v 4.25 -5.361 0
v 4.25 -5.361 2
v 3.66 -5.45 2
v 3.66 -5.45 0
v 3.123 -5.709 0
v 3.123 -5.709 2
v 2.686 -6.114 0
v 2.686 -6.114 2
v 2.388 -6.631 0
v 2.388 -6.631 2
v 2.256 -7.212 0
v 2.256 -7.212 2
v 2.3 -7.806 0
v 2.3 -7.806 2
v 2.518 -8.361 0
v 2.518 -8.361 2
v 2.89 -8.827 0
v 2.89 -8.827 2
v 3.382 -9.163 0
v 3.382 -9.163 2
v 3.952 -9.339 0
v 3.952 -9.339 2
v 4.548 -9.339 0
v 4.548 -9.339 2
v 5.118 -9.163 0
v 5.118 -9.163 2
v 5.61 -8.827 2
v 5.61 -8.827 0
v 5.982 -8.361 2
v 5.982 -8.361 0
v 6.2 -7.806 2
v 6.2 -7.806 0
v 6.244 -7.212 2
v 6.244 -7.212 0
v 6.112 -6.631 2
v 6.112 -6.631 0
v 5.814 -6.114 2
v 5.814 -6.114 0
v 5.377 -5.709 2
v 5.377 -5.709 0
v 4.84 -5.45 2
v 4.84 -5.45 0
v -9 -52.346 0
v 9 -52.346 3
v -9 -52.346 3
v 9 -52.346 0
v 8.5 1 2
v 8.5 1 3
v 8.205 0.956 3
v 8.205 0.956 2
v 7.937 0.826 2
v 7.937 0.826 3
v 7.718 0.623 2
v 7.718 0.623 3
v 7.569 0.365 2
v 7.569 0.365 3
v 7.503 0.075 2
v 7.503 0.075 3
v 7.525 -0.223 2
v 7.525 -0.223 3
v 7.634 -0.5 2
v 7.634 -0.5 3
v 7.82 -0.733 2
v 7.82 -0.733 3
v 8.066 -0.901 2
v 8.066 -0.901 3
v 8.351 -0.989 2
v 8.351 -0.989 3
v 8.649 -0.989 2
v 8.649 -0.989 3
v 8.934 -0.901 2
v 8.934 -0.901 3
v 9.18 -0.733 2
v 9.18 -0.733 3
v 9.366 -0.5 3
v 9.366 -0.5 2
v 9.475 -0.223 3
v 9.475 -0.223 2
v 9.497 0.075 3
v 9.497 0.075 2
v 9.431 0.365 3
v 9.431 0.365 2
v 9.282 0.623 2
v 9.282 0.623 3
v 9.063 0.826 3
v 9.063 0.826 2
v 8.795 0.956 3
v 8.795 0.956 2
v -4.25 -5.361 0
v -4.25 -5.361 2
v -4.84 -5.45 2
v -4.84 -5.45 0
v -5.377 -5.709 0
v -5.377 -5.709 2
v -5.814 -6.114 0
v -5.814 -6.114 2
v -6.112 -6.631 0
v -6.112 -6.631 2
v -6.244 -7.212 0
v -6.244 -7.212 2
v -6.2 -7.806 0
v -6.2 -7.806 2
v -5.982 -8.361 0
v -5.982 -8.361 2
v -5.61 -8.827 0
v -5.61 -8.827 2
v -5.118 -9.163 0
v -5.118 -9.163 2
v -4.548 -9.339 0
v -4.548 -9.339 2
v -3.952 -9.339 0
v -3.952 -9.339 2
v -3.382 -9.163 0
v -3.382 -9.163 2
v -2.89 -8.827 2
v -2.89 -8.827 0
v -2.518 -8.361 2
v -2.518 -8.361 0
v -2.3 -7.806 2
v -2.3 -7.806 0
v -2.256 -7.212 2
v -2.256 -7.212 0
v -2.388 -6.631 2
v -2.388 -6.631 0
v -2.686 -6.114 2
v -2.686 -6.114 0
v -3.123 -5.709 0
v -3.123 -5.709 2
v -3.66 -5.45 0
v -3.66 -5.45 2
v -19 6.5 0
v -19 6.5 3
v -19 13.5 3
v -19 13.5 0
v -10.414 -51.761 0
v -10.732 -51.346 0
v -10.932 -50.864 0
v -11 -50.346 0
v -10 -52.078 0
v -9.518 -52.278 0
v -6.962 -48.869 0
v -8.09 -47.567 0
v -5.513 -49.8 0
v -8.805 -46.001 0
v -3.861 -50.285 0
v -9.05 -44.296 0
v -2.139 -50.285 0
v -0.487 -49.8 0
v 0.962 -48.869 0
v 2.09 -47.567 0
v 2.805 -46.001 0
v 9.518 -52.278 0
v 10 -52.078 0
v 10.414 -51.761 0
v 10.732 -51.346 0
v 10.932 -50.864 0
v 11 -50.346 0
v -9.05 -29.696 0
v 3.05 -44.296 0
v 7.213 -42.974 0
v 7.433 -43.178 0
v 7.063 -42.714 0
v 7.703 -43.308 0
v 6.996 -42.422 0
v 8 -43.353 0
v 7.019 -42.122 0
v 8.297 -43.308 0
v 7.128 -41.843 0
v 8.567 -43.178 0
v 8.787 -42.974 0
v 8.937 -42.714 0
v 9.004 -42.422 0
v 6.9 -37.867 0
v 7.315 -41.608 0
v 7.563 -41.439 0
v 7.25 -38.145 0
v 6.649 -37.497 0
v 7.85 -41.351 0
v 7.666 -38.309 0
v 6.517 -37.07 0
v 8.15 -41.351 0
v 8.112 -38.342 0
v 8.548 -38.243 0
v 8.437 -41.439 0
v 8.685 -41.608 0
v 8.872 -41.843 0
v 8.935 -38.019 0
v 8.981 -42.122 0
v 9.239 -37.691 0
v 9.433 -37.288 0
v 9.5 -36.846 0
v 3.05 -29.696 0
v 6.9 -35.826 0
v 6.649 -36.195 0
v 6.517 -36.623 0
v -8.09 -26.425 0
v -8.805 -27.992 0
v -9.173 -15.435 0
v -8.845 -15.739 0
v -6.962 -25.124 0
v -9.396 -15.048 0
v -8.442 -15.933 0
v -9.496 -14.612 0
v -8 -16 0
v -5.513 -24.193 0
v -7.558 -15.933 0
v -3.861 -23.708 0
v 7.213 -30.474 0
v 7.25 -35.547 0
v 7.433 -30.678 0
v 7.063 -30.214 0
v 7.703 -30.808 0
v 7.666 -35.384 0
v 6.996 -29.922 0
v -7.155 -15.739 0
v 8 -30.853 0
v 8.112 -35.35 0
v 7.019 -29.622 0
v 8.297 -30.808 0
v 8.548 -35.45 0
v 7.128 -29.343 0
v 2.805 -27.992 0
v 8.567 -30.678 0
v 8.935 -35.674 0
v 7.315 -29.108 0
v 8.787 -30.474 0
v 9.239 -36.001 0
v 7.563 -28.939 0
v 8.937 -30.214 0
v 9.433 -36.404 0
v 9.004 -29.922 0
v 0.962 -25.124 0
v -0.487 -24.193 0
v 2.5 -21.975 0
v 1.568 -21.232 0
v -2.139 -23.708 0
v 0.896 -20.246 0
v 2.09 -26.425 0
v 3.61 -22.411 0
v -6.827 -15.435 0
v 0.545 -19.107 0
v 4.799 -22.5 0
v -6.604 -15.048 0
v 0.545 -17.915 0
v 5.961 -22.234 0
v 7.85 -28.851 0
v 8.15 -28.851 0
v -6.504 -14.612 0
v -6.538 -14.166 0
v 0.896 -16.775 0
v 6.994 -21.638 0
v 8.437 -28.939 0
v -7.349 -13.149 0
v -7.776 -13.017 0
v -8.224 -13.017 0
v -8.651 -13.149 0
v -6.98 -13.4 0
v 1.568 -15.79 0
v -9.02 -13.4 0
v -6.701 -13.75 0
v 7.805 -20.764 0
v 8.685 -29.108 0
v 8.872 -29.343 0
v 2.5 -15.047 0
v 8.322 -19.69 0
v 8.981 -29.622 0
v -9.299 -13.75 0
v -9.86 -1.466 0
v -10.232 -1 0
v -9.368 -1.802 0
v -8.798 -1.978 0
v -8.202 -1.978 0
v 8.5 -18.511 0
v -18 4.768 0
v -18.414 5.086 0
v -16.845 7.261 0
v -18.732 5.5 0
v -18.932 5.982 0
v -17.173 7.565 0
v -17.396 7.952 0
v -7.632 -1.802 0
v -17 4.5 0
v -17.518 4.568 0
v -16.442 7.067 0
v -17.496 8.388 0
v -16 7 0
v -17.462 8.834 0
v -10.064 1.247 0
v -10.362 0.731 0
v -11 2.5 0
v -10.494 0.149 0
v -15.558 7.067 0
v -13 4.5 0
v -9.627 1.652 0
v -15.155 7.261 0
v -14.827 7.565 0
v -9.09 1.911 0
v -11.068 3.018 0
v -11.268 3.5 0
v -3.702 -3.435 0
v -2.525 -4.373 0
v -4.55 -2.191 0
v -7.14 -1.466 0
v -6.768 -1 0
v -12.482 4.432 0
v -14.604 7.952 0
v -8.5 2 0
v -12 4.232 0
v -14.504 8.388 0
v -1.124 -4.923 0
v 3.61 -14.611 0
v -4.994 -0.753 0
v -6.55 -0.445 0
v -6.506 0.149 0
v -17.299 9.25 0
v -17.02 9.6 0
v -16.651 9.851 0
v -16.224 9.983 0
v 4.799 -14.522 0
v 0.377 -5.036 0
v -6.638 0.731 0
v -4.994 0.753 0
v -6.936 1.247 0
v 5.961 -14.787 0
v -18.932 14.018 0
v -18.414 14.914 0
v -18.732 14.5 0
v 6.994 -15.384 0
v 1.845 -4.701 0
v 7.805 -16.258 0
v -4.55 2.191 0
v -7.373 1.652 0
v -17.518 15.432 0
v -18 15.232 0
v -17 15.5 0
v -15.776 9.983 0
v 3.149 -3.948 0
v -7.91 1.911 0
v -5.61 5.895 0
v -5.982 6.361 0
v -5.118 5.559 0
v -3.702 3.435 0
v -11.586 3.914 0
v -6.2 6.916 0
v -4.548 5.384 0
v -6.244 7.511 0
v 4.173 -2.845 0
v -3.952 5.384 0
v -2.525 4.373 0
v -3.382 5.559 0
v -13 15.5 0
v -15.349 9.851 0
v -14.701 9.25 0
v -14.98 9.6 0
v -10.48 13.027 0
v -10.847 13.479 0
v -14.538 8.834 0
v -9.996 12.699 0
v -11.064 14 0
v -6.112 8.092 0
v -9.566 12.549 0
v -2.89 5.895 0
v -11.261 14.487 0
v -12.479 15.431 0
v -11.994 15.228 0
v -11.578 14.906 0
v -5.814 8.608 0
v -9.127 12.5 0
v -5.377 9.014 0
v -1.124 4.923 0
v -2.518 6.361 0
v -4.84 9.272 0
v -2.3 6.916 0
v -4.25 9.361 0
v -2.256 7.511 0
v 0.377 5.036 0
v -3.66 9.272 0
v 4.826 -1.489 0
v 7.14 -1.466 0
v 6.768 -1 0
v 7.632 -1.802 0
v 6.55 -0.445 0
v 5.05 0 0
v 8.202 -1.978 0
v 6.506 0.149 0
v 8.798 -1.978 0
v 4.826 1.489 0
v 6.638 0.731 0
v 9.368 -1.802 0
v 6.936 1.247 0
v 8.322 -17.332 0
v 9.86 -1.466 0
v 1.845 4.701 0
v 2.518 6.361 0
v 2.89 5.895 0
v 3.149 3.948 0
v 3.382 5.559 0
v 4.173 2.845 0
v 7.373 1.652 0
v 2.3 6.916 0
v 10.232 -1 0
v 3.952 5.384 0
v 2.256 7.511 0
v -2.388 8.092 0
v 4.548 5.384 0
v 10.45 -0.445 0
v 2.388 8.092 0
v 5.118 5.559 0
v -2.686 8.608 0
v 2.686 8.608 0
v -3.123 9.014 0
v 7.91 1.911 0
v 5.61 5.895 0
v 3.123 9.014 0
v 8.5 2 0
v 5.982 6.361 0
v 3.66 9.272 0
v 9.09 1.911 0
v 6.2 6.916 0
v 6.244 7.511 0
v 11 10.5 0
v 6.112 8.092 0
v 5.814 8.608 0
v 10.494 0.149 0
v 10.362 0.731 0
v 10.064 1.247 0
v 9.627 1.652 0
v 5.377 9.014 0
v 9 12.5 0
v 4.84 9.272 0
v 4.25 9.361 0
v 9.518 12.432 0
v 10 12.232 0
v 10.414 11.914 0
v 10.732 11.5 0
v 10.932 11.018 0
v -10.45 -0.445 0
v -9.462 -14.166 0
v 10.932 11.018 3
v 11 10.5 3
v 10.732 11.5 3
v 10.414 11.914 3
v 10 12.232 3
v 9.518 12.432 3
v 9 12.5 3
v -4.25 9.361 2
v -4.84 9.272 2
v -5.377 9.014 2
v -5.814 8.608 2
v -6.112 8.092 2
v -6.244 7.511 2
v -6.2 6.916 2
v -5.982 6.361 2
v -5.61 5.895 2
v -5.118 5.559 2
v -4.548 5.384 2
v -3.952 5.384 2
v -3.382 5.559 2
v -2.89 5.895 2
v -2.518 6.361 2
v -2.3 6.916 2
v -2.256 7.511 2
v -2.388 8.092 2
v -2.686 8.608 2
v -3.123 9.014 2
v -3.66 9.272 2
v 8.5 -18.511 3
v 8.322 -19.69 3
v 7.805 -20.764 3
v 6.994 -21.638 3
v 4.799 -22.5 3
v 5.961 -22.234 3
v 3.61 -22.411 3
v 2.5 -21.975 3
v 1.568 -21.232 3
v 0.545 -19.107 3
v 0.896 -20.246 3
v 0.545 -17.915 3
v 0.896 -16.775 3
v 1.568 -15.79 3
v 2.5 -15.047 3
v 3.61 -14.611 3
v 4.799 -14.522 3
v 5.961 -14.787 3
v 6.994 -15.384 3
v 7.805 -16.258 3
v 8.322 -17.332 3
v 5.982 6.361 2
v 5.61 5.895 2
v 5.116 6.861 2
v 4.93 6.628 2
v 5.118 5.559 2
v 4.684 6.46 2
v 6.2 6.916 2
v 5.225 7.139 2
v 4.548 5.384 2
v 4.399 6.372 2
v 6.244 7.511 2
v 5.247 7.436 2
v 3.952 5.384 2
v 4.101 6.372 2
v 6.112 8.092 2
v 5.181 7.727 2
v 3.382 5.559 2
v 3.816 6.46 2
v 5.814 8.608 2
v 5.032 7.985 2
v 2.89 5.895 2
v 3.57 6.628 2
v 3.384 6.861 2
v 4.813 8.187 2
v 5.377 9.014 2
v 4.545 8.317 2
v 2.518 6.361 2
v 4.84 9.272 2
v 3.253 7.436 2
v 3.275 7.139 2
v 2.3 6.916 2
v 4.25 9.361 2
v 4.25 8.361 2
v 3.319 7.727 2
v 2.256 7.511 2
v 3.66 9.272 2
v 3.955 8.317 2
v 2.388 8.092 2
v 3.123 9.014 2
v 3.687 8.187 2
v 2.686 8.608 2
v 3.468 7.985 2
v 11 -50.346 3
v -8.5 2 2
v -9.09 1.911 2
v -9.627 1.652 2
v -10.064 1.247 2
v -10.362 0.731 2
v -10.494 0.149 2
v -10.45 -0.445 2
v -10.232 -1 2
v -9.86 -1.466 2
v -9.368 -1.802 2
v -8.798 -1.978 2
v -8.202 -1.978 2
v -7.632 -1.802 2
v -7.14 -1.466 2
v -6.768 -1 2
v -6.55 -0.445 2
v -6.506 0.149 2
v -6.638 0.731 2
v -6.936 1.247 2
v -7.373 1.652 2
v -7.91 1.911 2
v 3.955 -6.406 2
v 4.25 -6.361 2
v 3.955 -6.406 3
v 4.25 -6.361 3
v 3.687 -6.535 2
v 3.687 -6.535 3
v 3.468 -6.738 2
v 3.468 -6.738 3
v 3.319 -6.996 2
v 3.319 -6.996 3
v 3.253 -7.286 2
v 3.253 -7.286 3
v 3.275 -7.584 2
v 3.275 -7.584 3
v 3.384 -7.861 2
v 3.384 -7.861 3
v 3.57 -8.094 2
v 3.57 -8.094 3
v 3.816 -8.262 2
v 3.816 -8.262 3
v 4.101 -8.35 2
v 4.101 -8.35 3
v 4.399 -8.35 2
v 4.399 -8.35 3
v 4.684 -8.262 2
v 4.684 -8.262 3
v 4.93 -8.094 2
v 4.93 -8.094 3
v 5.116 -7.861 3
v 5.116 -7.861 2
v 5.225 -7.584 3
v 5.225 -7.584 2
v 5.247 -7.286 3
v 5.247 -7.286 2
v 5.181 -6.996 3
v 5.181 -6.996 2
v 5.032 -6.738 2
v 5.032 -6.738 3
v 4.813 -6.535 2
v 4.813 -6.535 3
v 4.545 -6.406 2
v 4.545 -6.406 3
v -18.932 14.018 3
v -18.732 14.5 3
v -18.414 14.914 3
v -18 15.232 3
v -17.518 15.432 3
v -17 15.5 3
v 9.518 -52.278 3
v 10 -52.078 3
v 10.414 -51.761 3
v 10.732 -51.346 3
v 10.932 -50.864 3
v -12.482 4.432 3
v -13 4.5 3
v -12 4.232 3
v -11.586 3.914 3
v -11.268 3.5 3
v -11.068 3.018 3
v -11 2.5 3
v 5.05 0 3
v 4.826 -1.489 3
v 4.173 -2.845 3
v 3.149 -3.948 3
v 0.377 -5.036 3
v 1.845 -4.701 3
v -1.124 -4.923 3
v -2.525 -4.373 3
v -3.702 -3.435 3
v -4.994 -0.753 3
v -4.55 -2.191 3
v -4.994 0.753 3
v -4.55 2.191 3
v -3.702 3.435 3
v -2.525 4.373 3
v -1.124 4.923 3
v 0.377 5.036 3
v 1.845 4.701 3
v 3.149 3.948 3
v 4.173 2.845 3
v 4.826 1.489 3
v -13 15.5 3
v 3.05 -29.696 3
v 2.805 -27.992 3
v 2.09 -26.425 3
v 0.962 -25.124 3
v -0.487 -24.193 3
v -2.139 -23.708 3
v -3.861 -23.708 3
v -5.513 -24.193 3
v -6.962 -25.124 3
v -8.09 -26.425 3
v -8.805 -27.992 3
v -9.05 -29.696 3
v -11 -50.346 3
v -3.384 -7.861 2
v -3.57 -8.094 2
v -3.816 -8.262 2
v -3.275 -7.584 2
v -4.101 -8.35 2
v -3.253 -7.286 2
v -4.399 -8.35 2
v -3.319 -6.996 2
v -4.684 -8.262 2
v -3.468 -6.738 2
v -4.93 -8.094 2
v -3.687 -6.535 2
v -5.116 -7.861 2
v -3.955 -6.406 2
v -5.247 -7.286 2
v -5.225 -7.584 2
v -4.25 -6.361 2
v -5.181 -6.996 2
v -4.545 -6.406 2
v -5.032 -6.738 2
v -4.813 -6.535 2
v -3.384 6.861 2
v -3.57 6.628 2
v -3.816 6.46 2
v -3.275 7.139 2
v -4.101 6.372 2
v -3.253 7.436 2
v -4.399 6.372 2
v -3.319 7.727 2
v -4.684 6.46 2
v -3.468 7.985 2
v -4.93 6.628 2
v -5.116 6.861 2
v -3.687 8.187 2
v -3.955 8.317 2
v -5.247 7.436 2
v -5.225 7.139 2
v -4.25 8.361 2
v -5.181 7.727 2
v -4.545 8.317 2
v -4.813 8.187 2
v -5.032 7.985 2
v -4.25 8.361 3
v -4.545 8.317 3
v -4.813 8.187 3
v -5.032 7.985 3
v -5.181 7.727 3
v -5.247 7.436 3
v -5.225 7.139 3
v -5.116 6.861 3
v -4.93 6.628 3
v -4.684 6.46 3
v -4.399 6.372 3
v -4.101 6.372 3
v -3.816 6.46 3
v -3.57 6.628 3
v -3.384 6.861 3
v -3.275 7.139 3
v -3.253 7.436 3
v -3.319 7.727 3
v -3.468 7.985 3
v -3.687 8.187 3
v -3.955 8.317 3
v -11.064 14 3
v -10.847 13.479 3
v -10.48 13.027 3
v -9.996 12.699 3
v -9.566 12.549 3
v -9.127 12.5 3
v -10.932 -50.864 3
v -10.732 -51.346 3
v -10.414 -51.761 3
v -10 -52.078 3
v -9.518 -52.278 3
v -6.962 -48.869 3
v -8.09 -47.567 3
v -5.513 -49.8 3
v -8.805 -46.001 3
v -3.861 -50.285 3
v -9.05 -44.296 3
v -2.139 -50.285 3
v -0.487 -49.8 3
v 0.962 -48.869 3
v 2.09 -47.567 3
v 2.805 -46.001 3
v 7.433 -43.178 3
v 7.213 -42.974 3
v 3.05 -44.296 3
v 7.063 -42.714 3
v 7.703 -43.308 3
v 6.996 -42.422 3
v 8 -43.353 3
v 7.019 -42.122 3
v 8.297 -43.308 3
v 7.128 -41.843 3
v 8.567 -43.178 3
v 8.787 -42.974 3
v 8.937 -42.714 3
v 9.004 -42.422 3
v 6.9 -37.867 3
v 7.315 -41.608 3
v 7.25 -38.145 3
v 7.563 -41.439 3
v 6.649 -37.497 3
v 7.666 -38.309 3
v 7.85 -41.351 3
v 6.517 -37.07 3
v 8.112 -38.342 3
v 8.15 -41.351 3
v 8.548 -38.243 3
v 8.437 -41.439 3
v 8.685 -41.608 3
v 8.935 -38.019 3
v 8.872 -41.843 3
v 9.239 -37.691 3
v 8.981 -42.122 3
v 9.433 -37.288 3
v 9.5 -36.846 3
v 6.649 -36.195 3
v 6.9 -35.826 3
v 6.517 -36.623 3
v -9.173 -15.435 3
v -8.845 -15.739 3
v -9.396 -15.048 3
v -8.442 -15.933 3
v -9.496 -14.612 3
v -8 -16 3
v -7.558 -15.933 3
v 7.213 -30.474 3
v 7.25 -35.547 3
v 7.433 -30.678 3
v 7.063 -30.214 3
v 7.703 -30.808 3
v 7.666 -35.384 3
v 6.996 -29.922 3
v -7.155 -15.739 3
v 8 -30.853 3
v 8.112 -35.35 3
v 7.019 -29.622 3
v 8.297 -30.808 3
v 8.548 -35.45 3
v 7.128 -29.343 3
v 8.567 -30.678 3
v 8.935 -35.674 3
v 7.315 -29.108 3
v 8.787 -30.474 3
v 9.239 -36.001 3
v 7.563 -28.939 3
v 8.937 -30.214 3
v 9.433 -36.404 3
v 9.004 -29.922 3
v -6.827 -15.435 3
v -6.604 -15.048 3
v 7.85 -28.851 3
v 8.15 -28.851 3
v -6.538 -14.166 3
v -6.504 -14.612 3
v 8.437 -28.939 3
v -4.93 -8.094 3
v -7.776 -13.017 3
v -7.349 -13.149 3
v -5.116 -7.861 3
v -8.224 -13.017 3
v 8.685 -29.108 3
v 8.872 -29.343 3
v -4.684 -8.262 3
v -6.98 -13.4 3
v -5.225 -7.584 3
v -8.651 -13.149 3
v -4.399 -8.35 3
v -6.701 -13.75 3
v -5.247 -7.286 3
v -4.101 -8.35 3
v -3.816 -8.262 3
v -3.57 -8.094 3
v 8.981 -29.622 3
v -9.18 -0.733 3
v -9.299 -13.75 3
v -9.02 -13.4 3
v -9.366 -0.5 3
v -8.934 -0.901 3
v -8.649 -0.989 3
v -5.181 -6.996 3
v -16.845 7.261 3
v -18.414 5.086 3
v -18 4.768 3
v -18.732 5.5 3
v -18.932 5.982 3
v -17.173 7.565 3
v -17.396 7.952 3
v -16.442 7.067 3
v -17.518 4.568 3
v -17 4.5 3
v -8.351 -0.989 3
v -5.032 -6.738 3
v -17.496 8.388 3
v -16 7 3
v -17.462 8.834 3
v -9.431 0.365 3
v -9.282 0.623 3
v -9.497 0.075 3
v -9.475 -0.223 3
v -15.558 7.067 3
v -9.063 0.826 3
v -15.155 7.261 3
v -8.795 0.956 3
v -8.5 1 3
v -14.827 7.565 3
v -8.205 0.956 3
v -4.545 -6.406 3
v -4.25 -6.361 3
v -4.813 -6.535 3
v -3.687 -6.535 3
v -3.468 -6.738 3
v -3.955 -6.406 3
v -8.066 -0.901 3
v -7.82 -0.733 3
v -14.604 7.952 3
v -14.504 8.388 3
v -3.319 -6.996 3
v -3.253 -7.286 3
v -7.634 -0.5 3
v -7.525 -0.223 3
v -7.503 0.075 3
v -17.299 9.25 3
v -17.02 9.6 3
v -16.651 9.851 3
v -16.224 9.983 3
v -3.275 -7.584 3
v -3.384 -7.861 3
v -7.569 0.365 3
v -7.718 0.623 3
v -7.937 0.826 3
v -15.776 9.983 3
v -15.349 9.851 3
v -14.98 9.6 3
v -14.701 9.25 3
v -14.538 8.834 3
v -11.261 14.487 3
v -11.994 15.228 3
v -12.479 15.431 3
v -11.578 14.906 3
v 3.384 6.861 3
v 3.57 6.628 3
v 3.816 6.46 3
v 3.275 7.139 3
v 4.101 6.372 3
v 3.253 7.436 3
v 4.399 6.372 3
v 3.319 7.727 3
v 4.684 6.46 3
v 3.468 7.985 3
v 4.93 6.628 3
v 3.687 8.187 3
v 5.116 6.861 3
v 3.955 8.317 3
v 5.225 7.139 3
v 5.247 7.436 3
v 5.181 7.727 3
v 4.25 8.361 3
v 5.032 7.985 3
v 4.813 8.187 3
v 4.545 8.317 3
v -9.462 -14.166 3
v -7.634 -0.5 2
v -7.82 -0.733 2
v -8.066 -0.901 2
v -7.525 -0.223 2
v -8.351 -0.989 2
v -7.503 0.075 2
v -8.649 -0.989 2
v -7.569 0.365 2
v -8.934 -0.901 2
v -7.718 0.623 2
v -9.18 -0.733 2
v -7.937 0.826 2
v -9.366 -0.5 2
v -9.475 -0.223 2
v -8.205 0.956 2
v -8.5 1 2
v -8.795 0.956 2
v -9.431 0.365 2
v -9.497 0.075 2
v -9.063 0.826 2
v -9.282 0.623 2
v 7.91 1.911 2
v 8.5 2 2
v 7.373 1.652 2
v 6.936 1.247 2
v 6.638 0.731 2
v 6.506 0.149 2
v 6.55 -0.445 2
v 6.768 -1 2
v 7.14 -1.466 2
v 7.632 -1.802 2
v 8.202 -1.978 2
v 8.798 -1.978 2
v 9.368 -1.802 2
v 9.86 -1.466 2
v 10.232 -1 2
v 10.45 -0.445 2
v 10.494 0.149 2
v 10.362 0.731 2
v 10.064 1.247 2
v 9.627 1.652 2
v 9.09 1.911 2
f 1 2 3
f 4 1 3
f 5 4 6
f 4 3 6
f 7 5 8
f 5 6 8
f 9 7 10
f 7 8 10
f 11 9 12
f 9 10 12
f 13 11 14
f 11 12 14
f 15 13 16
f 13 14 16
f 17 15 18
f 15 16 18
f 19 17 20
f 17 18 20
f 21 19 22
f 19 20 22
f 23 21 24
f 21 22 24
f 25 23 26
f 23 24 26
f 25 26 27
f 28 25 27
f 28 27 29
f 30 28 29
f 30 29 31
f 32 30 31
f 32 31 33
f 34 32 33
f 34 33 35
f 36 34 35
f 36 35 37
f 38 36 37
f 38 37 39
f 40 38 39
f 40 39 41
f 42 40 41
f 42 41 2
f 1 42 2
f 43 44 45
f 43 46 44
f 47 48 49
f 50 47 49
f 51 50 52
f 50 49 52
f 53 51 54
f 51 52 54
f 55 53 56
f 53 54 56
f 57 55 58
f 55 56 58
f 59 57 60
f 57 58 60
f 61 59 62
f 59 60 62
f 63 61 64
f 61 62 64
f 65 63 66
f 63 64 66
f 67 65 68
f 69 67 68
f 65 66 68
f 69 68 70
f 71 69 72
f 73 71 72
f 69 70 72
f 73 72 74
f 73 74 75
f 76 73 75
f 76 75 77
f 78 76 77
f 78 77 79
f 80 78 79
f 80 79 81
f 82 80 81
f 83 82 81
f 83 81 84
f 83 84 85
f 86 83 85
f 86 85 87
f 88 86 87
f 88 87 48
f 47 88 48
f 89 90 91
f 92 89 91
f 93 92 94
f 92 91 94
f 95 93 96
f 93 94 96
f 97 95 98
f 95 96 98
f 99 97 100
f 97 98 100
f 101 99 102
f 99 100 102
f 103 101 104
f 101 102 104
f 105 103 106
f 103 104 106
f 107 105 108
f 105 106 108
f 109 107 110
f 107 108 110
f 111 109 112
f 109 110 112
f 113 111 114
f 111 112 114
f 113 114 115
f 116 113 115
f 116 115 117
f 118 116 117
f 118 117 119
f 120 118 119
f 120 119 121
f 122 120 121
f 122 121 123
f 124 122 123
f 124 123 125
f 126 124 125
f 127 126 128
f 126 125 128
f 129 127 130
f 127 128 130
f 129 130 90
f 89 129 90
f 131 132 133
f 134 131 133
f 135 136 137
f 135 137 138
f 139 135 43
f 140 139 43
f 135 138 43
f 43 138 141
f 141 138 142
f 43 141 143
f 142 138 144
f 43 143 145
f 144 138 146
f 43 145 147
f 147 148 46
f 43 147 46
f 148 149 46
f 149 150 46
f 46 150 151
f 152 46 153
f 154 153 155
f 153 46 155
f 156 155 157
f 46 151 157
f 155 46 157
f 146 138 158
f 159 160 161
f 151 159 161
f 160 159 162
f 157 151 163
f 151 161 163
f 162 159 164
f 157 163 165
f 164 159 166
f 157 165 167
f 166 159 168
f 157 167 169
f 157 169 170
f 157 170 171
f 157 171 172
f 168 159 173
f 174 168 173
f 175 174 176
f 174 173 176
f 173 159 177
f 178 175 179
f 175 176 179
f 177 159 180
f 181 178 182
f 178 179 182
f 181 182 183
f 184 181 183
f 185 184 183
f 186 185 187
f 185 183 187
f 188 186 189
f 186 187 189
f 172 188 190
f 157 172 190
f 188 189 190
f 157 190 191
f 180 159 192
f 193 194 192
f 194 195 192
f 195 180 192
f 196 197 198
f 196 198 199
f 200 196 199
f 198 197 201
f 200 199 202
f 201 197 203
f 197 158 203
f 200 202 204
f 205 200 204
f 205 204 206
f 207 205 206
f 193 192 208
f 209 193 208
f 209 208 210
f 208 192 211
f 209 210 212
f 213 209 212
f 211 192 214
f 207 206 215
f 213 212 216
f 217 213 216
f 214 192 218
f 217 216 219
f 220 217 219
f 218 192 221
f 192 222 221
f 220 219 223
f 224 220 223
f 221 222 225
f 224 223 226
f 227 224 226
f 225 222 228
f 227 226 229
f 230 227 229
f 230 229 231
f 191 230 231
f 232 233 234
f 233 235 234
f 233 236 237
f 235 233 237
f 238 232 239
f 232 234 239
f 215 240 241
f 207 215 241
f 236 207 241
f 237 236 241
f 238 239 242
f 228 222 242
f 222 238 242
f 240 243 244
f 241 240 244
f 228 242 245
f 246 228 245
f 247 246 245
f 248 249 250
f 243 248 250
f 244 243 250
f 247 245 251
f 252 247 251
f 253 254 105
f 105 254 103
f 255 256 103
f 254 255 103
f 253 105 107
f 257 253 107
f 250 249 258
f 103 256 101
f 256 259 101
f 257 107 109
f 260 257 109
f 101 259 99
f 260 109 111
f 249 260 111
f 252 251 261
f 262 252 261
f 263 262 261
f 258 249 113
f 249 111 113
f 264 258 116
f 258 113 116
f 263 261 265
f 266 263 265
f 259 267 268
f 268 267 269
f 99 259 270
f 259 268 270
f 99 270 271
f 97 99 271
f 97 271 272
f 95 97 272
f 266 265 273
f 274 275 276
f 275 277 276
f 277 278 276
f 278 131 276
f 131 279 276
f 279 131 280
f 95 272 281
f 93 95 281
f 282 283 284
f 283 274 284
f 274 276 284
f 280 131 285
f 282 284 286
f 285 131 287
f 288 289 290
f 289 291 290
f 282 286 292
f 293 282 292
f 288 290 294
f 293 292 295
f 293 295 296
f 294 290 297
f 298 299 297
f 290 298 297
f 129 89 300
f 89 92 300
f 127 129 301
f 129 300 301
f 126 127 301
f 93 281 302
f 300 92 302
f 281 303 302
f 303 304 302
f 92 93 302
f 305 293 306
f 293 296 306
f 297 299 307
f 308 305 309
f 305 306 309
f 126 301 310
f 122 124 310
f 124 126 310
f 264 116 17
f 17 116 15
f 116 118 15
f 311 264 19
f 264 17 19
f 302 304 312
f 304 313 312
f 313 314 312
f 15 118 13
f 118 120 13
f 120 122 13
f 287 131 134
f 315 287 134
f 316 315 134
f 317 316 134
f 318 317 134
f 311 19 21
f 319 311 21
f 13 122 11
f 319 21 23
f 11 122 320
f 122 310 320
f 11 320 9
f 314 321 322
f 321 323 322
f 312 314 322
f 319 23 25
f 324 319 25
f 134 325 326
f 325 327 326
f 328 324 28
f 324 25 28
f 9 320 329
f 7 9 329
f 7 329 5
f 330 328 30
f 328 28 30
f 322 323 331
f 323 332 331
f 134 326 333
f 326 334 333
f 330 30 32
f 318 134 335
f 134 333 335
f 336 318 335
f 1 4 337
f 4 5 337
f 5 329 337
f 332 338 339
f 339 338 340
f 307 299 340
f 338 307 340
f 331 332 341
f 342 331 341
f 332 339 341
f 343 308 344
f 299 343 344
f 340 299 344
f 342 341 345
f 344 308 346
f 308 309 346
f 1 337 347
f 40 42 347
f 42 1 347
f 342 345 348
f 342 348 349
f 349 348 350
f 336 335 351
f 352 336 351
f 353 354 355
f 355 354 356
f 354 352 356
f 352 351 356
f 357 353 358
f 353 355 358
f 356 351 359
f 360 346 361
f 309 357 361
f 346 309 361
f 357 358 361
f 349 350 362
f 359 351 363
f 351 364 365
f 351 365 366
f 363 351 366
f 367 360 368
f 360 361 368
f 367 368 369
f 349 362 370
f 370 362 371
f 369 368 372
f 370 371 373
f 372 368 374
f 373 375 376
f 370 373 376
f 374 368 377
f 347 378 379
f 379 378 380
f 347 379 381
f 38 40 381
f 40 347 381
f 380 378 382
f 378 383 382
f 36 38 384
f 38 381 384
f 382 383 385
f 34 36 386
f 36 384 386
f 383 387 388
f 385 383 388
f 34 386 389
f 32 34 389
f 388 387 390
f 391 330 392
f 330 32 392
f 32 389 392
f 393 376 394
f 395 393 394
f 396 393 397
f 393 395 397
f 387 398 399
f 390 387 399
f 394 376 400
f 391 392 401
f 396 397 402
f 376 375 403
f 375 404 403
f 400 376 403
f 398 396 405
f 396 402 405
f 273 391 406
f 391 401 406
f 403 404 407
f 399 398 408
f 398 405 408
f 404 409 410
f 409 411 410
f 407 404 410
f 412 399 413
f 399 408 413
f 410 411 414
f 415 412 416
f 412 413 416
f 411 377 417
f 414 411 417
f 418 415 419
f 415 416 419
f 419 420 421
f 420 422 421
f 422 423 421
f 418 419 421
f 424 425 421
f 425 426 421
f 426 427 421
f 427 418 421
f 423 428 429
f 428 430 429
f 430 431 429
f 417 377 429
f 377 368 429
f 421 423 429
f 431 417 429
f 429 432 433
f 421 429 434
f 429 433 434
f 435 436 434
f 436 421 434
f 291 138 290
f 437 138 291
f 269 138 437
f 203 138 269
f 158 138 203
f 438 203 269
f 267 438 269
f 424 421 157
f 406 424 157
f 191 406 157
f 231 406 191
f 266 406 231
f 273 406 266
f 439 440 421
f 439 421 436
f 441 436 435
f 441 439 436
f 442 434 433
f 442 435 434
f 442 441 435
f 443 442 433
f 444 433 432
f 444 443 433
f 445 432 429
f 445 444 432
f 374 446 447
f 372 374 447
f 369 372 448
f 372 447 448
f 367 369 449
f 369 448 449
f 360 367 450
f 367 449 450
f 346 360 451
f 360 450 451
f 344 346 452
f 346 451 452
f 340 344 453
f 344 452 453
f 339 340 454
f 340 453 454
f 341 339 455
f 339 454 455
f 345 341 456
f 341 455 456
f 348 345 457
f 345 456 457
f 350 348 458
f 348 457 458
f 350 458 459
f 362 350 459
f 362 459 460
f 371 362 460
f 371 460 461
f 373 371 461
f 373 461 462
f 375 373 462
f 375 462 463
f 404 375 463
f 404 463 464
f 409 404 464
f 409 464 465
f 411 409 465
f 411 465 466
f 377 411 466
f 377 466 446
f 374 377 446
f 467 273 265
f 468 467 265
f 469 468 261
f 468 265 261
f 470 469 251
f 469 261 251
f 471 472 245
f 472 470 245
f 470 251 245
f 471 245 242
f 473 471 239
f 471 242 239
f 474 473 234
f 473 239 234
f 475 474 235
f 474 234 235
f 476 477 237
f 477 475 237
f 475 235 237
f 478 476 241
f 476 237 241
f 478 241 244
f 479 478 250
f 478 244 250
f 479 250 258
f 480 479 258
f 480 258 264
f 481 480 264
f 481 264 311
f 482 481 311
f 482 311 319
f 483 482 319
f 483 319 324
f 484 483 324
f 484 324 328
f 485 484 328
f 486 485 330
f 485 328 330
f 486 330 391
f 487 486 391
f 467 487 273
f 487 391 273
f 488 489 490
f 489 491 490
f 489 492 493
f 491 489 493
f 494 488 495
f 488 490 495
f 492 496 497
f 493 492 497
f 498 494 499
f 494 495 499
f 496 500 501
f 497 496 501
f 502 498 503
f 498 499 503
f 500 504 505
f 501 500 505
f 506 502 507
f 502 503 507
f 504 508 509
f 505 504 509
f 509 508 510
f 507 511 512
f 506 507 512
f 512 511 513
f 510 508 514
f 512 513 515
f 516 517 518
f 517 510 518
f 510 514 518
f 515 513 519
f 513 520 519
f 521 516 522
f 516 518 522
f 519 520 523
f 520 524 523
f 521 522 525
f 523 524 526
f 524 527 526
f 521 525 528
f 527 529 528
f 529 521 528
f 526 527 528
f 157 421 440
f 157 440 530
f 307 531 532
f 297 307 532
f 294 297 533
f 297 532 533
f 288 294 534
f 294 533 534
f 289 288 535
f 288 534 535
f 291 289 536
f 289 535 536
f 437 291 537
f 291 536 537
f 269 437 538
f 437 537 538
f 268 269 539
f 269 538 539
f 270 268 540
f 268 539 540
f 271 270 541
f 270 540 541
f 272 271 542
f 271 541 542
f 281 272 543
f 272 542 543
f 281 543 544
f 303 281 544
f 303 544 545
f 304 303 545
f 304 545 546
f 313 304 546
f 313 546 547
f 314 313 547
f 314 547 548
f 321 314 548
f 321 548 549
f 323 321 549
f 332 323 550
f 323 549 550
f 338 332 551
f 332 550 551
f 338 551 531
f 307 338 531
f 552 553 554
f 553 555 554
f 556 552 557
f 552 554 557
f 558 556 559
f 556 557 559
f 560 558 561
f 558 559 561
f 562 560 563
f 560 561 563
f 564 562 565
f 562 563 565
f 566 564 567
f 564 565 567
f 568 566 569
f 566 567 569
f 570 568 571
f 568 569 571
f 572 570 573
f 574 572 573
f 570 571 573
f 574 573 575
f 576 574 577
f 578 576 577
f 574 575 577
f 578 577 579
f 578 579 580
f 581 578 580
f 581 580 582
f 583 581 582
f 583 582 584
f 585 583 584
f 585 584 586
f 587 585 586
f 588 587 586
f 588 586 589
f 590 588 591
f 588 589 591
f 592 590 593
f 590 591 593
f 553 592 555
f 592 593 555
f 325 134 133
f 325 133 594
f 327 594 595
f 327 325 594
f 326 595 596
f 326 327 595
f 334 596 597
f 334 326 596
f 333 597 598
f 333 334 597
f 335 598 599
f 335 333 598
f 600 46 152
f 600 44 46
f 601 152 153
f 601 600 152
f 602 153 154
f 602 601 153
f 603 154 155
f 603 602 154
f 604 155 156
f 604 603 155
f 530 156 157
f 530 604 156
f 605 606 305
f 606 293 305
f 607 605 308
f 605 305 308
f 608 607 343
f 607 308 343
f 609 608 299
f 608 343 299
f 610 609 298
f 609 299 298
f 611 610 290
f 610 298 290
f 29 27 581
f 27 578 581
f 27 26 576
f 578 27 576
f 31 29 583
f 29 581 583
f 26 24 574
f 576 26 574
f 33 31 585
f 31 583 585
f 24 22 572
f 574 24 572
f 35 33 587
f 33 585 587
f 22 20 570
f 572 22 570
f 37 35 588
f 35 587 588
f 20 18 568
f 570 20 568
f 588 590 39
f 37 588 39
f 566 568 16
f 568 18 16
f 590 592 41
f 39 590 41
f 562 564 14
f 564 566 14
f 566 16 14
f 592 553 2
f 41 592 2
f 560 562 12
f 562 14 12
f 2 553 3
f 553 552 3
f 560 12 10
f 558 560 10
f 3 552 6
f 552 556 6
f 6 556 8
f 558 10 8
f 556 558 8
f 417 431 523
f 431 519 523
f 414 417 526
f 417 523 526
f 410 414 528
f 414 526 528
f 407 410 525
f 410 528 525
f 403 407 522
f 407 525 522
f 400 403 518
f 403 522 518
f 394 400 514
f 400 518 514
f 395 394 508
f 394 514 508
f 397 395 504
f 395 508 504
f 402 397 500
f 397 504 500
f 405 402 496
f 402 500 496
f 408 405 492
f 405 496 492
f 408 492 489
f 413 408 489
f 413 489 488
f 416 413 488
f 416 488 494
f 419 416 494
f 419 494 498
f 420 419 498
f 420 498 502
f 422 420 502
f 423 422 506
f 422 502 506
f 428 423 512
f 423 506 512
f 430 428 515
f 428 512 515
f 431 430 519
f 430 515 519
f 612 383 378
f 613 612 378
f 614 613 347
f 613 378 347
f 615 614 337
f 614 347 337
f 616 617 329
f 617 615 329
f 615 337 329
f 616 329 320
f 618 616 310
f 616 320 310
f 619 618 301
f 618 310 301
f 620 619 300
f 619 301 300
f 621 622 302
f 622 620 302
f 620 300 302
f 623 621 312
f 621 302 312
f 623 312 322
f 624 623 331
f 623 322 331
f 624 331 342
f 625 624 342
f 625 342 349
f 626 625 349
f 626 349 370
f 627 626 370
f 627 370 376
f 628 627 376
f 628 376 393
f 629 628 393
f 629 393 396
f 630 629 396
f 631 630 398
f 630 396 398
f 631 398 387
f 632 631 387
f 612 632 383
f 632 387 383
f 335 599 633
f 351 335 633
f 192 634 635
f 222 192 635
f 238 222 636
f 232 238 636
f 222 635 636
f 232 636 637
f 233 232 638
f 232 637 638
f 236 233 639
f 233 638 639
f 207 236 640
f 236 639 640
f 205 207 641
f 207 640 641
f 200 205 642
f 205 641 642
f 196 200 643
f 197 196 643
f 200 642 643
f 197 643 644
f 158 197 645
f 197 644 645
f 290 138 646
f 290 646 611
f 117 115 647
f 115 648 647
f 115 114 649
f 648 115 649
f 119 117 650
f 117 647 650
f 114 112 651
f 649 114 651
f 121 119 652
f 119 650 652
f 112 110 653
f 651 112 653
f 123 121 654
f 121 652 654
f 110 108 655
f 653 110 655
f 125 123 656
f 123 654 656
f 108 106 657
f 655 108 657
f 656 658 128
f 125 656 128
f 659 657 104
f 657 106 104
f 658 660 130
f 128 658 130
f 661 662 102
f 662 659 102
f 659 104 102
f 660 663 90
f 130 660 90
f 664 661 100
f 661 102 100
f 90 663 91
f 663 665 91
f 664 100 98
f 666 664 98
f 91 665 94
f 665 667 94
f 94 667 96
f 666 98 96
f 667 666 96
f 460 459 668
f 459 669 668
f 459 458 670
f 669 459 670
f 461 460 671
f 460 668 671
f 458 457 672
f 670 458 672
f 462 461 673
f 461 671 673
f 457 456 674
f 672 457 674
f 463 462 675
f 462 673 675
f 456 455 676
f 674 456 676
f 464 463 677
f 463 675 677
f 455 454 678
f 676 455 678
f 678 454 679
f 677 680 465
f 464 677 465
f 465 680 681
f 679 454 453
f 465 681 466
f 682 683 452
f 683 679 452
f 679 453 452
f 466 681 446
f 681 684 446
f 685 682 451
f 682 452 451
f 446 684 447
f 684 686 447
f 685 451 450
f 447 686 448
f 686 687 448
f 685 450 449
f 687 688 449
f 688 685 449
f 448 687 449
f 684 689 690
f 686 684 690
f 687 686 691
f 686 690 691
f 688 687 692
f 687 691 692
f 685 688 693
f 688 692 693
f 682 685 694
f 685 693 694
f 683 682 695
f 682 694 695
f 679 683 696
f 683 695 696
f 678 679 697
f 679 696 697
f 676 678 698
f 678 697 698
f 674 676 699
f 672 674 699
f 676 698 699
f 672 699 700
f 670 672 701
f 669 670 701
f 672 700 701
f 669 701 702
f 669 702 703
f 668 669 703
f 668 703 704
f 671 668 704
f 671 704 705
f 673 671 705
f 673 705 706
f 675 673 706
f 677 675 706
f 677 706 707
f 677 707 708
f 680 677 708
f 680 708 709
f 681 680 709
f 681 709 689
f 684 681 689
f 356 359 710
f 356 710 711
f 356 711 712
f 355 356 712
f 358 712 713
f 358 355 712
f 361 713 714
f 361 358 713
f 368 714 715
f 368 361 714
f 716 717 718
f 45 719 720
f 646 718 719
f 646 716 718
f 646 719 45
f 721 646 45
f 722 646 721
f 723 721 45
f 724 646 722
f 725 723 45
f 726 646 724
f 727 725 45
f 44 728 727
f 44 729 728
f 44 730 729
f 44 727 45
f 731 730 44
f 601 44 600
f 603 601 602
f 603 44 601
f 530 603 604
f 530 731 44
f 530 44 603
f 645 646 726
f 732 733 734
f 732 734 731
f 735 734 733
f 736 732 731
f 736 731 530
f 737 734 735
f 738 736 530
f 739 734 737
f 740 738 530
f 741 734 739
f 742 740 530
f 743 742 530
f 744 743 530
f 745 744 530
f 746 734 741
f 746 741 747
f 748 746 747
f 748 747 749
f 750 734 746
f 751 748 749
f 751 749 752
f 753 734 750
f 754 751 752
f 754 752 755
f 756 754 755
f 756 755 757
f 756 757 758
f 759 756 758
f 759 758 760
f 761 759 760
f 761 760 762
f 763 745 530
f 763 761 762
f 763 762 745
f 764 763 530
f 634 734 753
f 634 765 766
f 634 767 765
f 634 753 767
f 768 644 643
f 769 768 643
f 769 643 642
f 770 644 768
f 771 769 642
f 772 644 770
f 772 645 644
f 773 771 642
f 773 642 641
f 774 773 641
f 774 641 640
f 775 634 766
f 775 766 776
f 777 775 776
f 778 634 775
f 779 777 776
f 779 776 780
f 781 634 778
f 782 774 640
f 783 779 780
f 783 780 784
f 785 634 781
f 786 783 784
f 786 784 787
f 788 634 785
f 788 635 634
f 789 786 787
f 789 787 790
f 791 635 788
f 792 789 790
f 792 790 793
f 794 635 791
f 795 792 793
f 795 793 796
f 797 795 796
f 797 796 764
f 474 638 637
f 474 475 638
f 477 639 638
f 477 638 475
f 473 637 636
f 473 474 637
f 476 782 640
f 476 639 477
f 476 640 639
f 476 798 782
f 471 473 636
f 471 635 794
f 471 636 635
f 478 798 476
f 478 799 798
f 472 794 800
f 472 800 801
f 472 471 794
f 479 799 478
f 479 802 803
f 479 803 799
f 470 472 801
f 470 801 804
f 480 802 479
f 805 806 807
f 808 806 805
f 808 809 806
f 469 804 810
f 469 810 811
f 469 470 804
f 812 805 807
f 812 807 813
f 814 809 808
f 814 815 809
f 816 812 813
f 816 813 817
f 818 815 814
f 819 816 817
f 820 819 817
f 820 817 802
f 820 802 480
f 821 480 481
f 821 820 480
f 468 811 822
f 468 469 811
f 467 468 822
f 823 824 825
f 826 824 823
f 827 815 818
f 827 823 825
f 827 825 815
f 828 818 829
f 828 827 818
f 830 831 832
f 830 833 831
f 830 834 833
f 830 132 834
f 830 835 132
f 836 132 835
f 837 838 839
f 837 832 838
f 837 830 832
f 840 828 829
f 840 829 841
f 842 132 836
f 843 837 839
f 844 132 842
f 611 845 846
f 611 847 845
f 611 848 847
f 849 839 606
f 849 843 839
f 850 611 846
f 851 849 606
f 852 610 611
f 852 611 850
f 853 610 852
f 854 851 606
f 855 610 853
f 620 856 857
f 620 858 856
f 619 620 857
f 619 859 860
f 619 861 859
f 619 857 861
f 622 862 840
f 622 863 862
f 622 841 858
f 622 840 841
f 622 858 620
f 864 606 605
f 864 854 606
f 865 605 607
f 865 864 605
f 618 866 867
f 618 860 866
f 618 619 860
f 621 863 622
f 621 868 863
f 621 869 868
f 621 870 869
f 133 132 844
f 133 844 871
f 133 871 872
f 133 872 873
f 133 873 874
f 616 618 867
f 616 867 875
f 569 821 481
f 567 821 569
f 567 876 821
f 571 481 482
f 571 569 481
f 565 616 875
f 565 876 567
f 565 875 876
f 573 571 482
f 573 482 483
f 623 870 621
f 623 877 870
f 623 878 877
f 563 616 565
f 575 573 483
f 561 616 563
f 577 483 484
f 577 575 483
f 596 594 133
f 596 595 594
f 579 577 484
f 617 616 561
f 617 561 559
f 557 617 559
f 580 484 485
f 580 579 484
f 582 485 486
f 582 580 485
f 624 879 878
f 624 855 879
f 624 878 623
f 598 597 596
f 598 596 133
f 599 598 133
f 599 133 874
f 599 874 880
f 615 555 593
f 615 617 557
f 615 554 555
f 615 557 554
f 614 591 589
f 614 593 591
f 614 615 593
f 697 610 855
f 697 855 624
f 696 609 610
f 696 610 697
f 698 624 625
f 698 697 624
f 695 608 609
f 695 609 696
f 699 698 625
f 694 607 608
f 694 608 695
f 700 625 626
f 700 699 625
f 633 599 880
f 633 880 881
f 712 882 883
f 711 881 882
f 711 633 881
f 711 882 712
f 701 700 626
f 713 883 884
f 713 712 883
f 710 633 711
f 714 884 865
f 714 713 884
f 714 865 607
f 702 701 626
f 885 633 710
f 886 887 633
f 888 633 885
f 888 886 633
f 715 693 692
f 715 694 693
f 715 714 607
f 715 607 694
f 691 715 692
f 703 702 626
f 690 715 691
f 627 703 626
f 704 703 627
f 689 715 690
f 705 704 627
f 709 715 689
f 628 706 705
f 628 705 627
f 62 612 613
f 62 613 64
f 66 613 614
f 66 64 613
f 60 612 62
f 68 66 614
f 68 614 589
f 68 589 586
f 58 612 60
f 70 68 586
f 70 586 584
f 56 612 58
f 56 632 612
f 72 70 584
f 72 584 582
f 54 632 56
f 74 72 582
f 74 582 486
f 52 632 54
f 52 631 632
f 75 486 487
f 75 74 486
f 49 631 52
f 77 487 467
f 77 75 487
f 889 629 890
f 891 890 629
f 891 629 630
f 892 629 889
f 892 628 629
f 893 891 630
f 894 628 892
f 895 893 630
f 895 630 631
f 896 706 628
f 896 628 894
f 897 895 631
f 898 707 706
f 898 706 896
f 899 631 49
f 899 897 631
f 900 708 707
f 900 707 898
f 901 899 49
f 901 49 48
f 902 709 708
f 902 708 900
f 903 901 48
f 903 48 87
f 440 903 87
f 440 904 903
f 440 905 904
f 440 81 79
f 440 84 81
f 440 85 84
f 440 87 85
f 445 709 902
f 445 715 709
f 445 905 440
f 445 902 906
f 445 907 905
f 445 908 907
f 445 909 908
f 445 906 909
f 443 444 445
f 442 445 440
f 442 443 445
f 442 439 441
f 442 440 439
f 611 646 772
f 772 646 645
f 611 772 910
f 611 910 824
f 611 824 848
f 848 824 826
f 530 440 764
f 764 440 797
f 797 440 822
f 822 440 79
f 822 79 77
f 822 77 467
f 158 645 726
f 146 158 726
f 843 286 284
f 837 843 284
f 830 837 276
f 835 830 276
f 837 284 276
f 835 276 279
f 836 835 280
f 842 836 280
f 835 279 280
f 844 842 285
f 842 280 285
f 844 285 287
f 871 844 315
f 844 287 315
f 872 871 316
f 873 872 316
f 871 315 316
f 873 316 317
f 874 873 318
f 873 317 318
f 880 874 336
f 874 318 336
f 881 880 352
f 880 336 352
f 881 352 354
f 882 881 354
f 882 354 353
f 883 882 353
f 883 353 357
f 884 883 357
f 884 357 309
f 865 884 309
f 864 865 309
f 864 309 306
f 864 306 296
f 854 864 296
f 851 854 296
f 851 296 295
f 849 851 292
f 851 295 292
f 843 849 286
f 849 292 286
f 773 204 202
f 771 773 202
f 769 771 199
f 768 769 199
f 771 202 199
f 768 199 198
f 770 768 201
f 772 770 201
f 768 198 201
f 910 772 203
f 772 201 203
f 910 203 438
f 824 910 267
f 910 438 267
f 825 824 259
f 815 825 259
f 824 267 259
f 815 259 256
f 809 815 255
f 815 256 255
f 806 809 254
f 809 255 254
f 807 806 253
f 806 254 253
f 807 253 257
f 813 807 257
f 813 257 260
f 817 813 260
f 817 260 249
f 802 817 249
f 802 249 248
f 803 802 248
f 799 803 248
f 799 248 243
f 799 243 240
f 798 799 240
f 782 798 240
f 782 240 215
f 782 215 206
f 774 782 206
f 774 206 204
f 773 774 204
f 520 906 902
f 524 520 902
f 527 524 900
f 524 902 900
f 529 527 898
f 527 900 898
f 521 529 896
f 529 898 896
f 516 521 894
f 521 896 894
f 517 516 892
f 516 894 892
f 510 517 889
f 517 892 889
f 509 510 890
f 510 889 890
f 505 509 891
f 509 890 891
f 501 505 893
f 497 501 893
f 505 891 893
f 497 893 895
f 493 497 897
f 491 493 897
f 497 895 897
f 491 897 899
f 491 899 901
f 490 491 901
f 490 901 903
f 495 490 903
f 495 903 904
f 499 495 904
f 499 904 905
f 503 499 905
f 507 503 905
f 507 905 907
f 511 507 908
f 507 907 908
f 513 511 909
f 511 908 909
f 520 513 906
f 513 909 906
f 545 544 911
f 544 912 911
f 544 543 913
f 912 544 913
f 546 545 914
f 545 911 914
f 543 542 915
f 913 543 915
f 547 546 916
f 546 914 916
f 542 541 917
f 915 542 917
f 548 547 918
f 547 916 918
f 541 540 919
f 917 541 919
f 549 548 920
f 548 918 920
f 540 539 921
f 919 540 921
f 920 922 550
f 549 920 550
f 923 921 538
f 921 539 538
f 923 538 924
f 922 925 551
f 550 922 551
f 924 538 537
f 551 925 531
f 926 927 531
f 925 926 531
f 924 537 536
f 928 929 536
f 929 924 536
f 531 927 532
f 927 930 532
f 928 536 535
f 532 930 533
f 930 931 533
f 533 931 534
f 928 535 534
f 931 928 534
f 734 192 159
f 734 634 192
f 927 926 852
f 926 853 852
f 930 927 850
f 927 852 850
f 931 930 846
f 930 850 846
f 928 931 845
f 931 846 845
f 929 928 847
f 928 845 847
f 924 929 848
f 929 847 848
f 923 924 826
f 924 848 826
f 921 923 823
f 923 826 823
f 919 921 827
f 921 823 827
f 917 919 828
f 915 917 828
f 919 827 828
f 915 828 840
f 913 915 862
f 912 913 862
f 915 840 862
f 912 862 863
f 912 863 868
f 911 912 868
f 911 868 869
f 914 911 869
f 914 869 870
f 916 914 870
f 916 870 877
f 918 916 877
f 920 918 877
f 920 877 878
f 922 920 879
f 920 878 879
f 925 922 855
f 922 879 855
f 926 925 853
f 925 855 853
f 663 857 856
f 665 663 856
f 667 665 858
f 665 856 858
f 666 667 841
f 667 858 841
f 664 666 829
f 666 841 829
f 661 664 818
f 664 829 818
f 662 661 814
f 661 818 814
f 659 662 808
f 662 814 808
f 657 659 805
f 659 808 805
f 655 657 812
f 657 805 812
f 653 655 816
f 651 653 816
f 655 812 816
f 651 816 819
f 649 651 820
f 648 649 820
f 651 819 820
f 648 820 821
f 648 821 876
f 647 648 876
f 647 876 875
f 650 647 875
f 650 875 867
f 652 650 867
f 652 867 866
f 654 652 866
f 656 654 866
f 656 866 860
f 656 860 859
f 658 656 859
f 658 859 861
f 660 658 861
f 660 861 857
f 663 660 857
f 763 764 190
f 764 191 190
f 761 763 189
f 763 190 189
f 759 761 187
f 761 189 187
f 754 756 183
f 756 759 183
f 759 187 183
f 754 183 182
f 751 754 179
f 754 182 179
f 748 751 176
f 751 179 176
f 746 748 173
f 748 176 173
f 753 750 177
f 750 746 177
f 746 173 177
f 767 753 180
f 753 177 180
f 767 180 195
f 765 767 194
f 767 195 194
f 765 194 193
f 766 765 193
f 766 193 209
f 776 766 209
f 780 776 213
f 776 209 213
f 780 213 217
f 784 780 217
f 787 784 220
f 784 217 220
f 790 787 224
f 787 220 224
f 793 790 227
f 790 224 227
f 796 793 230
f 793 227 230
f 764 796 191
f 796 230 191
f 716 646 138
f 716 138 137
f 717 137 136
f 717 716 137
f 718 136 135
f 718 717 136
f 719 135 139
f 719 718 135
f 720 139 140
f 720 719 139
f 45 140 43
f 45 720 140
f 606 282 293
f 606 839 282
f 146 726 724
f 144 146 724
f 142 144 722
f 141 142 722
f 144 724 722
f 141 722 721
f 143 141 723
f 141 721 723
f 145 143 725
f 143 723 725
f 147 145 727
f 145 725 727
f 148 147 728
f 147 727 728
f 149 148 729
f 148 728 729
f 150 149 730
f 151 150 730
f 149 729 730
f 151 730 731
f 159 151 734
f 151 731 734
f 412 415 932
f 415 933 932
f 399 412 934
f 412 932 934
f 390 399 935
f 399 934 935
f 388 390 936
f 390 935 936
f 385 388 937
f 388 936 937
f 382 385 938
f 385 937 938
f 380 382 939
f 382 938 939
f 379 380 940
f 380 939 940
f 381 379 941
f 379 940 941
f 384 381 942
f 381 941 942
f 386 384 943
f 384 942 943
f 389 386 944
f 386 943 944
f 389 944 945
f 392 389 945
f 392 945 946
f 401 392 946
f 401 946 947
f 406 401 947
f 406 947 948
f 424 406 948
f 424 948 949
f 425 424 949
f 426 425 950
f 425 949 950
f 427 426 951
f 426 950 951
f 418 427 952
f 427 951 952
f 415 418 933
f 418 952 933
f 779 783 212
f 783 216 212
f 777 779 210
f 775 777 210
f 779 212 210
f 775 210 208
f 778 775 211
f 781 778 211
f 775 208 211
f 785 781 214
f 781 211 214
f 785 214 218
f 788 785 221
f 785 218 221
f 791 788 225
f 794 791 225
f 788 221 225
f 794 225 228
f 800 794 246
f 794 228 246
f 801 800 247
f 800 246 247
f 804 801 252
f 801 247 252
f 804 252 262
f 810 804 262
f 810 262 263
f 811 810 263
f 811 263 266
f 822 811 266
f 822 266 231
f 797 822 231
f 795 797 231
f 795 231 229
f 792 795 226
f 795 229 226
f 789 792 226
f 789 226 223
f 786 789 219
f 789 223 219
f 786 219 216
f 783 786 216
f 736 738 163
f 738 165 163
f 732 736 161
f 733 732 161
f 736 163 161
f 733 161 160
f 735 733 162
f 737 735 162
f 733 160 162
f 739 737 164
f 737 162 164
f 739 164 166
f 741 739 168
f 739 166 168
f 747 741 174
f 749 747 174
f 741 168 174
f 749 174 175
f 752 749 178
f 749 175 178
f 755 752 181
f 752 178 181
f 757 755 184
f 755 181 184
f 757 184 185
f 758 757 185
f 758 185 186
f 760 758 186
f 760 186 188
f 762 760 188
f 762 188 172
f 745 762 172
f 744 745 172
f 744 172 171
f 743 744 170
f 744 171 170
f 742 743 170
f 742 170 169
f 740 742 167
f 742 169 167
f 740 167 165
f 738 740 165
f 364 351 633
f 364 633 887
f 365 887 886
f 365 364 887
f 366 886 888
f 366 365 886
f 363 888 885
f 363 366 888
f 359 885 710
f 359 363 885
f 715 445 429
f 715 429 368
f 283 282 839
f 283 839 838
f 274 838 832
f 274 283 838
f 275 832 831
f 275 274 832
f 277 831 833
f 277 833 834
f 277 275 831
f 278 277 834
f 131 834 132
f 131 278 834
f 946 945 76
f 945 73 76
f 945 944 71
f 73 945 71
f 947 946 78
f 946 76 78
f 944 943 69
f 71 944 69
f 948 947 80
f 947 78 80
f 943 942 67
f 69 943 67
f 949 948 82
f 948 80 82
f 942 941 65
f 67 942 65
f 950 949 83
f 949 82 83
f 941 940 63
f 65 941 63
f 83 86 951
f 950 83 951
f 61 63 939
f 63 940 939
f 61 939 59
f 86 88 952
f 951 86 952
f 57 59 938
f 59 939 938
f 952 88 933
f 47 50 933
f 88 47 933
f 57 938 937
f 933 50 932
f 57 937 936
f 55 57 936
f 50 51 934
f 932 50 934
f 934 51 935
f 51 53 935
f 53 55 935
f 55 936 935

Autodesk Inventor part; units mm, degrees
ref_plane "YZ Plane" through (0, 0, 0) normal (1, 0, 0) x (0, 1, 0)
ref_plane "XZ Plane" through (0, 0, 0) normal (0, 1, 0) x (-1, 0, 0)
ref_plane "XY Plane" through (0, 0, 0) normal (0, 0, 1) x (1, 0, 0)
sketch "Sketch1" plane through (0, 0, 0) normal (0, 0, 1) x (1, 0, 0)
  circle A0 centre (0, 0) radius 5 construction
  circle A1 centre (0, 0) radius 5.05
  line L0 (-11, 12.5) -> (11, 12.5)
  line L1 (11, 12.5) -> (11, -52.3463)
  line L2 (11, -52.3463) -> (-11, -52.3463)
  line L3 (-11, -52.3463) -> (-11, 12.5)
  circle A2 centre (0, 0) radius 12.5 construction
  circle A3 centre (4.5, -18.5109) radius 6.5 construction
  circle A4 centre (4.5, -18.5109) radius 7.5 construction
  circle A5 centre (4.5, -18.5109) radius 4
  circle A6 centre (24.9354, -38.9463) radius 21.4 construction
  line L4 (4.5, -18.5109) -> (24.9354, -38.9463) construction
  line L5 (0, 48.1253) -> (0, -78.4249) construction
  circle A7 centre (0, 0) radius 19.05 construction
  line L6 (54.9772, -60.3463) -> (-51.313, -60.3463) construction
  line L7 (-70.5727, -54.3463) -> (77.7123, -54.3463) construction
  line L8 (8, -57.4182) -> (8, 30.0467) construction
  circle A8 centre (8, -36.8463) radius 1.5
  circle A9 centre (0, 0) radius 11 construction
  line L9 (12, -6.3386) -> (12, -55.2043) construction
  dimension "d8" = 38.1
  dimension "d0" = 10
  dimension "d1" = 10.1
  dimension "d2" = 25
  dimension "d3" = 13
  dimension "d4" = 15
  dimension "d5" = 8
  dimension "d6" = 42.8
  dimension "d7" = 45
  dimension "d9" = 6
  dimension "d10" = 2
  dimension "d11" = 3
  dimension "d12" = 3
  dimension "d27" = 22
  dimension "d71" = 15.5
  dimension "d84" = 64.8463
  dimension "d85" = 1
extrude "Extrusion1" add sketch "Sketch1" along normal blind 3
sketch "Sketch2" plane through (0, 0, 0) normal (0, 0, -1) x (-1, 0, 0)
  circle A0 centre (0, 0) radius 8.5 construction
  line L0 (-15.4, 0) -> (15.4, 0) construction
  point P0 (-8.5, 0)
  point P1 (-4.25, -7.3612)
  point P2 (4.25, -7.3612)
  point P3 (8.5, 0)
  point P4 (4.25, 7.3612)
  point P5 (-4.25, 7.3612)
  dimension "d15" = 17
  dimension "d18" = 360
hole "Hole1" at (8.5, 0, 0) at (4.25, -7.3612, 0) at (-4.25, -7.3612, 0) at (-8.5, 0, 0) at (-4.25, 7.3612, 0) at (4.25, 7.3612, 0) direction (0, 0, 1) diameter 2 end through all counterbore diameter 4 counterbore depth 2
sketch "Sketch3" plane through (0, 0, 3) normal (0, 0, 1) x (1, 0, 0)
  circle A0 centre (-3, -29.6963) radius 6.05 construction
  circle A1 centre (-3, -44.2963) radius 6.05 construction
  line L0 (-3, -52.9991) -> (-3, -16.007) construction
  line L1 (0, 25.5998) -> (0, -66.099) construction
  line L2 (-19.4661, -50.3463) -> (34.3963, -50.3463) construction
  line L3 (-11, -52.3463) -> (11, -52.3463) construction
  line L4 (-9.05, -29.6963) -> (-9.05, -44.2963)
  line L5 (3.05, -29.6963) -> (3.05, -44.2963)
  arc A2 (3.05, -29.6963) -> (-9.05, -29.6963) centre (-3, -29.6963) ccw
  arc A3 (-9.05, -44.2963) -> (3.05, -44.2963) centre (-3, -44.2963) ccw
  point P0 (0, 0)
  dimension "d28" = 12.1
  dimension "d29" = 14.6
  dimension "d30" = 3
  dimension "d31" = 2
extrude "Extrusion2" cut sketch "Sketch3" against normal through all
sketch "Sketch4" plane through (0, 0, 3) normal (0, 0, 1) x (1, 0, 0)
  circle A0 centre (0, 0) radius 13 construction
  circle A1 centre (4.5, -18.5109) radius 4 construction
  circle A2 centre (4.5, -18.5109) radius 7 construction
  line L0 (-30.9627, -14.5) -> (22.7085, -14.5) construction
  line L1 (-11, 12.5) -> (-11, -52.3463) construction
  line L2 (11, 12.5) -> (-11, 12.5) construction
  line L3 (-11, -12.7679) -> (-8, -11.0359) construction
  line L4 (-8, -11.0359) -> (-5, -12.7679) construction
  line L5 (-5, -12.7679) -> (-5, -16.2321) construction
  line L6 (-5, -16.2321) -> (-8, -17.9641) construction
  line L7 (-8, -17.9641) -> (-11, -16.2321) construction
  line L8 (-11, -16.2321) -> (-11, -12.7679) construction
  circle A3 centre (-8, -14.5) radius 2.8 construction
  dimension "d34" = 26
  dimension "d35" = 14
  dimension "d36" = 6
  dimension "d37" = 27
  dimension "d72" = 5.6
hole "Hole2" at (-8, -14.5, 3) direction (0, 0, -1) diameter 3 end through all
ref_plane "Work Plane1" through (-3, -29.6963, 3) normal (-1, 0, 0) x (0, 0, -1)
sketch "Sketch8" plane through (0, 0, 3) normal (0, 0, 1) x (1, 0, 0)
  line L0 (11, 12.5) -> (-11, 12.5) projected
  line L1 (-11, 12.5) -> (-19, 12.5)
  line L2 (-19, 12.5) -> (-19, 4.5)
  line L3 (-19, 4.5) -> (-11, 4.5)
  line L4 (-11, 4.5) -> (-11, 12.5)
  point P0 (0, 0)
  dimension "d58" = 8
  dimension "d59" = 8
extrude "Extrusion4" add sketch "Sketch8" against normal up to surface (3 mm away)
sketch "Sketch9" plane through (0, 0, 3) normal (0, 0, 1) x (1, 0, 0)
  line L0 (-19, 12.5) -> (-19, 4.5) construction
  line L1 (-19, 8.5) -> (-9.7013, 8.5) construction
  line L2 (11, 12.5) -> (-19, 12.5) construction
  line L3 (-16, 12.5) -> (-16, 1.2197) construction
  point P0 (0, 0)
  point P1 (-16, 8.5)
  dimension "d62" = 3
hole "Hole4" at (-16, 8.5, 3) direction (0, 0, -1) diameter 3 end through all
fillet "Fillet2" radius 2 6 edges at (11, -52.3463, 1.5) (-11, -52.3463, 1.5) (11, 12.5, 1.5) (-19, 12.5, 1.5) (-19, 4.5, 1.5) (-11, 4.5, 1.5)
sketch "Sketch12" plane through (0, 0, 3) normal (0, 0, 1) x (1, 0, 0)
  circle A0 centre (8, -36.8463) radius 1.5 construction
  line L0 (8, -27.4514) -> (8, -47.8605) construction
  line L1 (24.4744, -26.8463) -> (0, -26.8463) construction
  line L2 (-0.5807, -45.3463) -> (23.4788, -45.3463) construction
  line L3 (0.6637, -29.8463) -> (21.6536, -29.8463) construction
  line L4 (0, -42.3463) -> (23.4788, -42.3463) construction
  point P0 (0, 0)
  point P1 (8, -29.8463)
  point P2 (8, -42.3463)
  dimension "d73" = 10
  dimension "d74" = 8.5
  dimension "d75" = 3
  dimension "d76" = 3
hole "Hole5" at (8, -29.8463, 3) at (8, -42.3463, 3) direction (0, 0, -1) diameter 2.013 end through all thread size "M2.5x0.45" class "6H" standard "ANSI Metric M Profile"
sketch "Sketch13" plane through (0, 0, 3) normal (0, 0, 1) x (1, 0, 0)
  line L0 (-19, 10.5) -> (-19, 6.5) construction
  line L1 (9, 12.5) -> (-17, 12.5) construction
  line L2 (-19, 10.5) -> (-19, 15.5)
  line L3 (-19, 15.5) -> (-11, 15.5)
  line L4 (-11, 15.5) -> (-11, 12.5)
  line L5 (-11, 2.5) -> (-11, -50.3463) projected
  arc A0 (-17, 12.5) -> (-19, 10.5) centre (-17, 10.5) ccw projected
  line L6 (-17, 12.5) -> (-11, 12.5)
  point P0 (0, 0)
  dimension "d86" = 3
extrude "Extrusion5" add sketch "Sketch13" against normal up to surface (3 mm away)
fillet "Fillet3" radius 2 3 edges at (-19, 15.5, 1.5) (-11, 15.5, 1.5) (-11, 12.5, 1.5)
equation "\"d8\" = d2 + d3 + tol"
equation "\"d4\" = roller_diam"
equation "\"d5\" = roller_bearing_dia"
equation "\"d7\" = ball_roller_angle"
equation "\"d28\" = absorber_dia"
equation "\"d29\" = absorber_dia + absorber_length"
equation "\"tol\" = 0.1"
equation "\"z_motor\" = 50"
equation "\"z_roller\" = 26"
equation "\"pitch\" = 0.5"
equation "\"roller_diam\" = 15"
equation "\"roller_bearing_dia\" = 8"
equation "\"ball_roller_angle\" = 45deg"
equation "\"absorber_dia\" = 12.1"
equation "\"absorber_length\" = 2.5"
properties part number "side_plate" material "Aluminum 6061"
